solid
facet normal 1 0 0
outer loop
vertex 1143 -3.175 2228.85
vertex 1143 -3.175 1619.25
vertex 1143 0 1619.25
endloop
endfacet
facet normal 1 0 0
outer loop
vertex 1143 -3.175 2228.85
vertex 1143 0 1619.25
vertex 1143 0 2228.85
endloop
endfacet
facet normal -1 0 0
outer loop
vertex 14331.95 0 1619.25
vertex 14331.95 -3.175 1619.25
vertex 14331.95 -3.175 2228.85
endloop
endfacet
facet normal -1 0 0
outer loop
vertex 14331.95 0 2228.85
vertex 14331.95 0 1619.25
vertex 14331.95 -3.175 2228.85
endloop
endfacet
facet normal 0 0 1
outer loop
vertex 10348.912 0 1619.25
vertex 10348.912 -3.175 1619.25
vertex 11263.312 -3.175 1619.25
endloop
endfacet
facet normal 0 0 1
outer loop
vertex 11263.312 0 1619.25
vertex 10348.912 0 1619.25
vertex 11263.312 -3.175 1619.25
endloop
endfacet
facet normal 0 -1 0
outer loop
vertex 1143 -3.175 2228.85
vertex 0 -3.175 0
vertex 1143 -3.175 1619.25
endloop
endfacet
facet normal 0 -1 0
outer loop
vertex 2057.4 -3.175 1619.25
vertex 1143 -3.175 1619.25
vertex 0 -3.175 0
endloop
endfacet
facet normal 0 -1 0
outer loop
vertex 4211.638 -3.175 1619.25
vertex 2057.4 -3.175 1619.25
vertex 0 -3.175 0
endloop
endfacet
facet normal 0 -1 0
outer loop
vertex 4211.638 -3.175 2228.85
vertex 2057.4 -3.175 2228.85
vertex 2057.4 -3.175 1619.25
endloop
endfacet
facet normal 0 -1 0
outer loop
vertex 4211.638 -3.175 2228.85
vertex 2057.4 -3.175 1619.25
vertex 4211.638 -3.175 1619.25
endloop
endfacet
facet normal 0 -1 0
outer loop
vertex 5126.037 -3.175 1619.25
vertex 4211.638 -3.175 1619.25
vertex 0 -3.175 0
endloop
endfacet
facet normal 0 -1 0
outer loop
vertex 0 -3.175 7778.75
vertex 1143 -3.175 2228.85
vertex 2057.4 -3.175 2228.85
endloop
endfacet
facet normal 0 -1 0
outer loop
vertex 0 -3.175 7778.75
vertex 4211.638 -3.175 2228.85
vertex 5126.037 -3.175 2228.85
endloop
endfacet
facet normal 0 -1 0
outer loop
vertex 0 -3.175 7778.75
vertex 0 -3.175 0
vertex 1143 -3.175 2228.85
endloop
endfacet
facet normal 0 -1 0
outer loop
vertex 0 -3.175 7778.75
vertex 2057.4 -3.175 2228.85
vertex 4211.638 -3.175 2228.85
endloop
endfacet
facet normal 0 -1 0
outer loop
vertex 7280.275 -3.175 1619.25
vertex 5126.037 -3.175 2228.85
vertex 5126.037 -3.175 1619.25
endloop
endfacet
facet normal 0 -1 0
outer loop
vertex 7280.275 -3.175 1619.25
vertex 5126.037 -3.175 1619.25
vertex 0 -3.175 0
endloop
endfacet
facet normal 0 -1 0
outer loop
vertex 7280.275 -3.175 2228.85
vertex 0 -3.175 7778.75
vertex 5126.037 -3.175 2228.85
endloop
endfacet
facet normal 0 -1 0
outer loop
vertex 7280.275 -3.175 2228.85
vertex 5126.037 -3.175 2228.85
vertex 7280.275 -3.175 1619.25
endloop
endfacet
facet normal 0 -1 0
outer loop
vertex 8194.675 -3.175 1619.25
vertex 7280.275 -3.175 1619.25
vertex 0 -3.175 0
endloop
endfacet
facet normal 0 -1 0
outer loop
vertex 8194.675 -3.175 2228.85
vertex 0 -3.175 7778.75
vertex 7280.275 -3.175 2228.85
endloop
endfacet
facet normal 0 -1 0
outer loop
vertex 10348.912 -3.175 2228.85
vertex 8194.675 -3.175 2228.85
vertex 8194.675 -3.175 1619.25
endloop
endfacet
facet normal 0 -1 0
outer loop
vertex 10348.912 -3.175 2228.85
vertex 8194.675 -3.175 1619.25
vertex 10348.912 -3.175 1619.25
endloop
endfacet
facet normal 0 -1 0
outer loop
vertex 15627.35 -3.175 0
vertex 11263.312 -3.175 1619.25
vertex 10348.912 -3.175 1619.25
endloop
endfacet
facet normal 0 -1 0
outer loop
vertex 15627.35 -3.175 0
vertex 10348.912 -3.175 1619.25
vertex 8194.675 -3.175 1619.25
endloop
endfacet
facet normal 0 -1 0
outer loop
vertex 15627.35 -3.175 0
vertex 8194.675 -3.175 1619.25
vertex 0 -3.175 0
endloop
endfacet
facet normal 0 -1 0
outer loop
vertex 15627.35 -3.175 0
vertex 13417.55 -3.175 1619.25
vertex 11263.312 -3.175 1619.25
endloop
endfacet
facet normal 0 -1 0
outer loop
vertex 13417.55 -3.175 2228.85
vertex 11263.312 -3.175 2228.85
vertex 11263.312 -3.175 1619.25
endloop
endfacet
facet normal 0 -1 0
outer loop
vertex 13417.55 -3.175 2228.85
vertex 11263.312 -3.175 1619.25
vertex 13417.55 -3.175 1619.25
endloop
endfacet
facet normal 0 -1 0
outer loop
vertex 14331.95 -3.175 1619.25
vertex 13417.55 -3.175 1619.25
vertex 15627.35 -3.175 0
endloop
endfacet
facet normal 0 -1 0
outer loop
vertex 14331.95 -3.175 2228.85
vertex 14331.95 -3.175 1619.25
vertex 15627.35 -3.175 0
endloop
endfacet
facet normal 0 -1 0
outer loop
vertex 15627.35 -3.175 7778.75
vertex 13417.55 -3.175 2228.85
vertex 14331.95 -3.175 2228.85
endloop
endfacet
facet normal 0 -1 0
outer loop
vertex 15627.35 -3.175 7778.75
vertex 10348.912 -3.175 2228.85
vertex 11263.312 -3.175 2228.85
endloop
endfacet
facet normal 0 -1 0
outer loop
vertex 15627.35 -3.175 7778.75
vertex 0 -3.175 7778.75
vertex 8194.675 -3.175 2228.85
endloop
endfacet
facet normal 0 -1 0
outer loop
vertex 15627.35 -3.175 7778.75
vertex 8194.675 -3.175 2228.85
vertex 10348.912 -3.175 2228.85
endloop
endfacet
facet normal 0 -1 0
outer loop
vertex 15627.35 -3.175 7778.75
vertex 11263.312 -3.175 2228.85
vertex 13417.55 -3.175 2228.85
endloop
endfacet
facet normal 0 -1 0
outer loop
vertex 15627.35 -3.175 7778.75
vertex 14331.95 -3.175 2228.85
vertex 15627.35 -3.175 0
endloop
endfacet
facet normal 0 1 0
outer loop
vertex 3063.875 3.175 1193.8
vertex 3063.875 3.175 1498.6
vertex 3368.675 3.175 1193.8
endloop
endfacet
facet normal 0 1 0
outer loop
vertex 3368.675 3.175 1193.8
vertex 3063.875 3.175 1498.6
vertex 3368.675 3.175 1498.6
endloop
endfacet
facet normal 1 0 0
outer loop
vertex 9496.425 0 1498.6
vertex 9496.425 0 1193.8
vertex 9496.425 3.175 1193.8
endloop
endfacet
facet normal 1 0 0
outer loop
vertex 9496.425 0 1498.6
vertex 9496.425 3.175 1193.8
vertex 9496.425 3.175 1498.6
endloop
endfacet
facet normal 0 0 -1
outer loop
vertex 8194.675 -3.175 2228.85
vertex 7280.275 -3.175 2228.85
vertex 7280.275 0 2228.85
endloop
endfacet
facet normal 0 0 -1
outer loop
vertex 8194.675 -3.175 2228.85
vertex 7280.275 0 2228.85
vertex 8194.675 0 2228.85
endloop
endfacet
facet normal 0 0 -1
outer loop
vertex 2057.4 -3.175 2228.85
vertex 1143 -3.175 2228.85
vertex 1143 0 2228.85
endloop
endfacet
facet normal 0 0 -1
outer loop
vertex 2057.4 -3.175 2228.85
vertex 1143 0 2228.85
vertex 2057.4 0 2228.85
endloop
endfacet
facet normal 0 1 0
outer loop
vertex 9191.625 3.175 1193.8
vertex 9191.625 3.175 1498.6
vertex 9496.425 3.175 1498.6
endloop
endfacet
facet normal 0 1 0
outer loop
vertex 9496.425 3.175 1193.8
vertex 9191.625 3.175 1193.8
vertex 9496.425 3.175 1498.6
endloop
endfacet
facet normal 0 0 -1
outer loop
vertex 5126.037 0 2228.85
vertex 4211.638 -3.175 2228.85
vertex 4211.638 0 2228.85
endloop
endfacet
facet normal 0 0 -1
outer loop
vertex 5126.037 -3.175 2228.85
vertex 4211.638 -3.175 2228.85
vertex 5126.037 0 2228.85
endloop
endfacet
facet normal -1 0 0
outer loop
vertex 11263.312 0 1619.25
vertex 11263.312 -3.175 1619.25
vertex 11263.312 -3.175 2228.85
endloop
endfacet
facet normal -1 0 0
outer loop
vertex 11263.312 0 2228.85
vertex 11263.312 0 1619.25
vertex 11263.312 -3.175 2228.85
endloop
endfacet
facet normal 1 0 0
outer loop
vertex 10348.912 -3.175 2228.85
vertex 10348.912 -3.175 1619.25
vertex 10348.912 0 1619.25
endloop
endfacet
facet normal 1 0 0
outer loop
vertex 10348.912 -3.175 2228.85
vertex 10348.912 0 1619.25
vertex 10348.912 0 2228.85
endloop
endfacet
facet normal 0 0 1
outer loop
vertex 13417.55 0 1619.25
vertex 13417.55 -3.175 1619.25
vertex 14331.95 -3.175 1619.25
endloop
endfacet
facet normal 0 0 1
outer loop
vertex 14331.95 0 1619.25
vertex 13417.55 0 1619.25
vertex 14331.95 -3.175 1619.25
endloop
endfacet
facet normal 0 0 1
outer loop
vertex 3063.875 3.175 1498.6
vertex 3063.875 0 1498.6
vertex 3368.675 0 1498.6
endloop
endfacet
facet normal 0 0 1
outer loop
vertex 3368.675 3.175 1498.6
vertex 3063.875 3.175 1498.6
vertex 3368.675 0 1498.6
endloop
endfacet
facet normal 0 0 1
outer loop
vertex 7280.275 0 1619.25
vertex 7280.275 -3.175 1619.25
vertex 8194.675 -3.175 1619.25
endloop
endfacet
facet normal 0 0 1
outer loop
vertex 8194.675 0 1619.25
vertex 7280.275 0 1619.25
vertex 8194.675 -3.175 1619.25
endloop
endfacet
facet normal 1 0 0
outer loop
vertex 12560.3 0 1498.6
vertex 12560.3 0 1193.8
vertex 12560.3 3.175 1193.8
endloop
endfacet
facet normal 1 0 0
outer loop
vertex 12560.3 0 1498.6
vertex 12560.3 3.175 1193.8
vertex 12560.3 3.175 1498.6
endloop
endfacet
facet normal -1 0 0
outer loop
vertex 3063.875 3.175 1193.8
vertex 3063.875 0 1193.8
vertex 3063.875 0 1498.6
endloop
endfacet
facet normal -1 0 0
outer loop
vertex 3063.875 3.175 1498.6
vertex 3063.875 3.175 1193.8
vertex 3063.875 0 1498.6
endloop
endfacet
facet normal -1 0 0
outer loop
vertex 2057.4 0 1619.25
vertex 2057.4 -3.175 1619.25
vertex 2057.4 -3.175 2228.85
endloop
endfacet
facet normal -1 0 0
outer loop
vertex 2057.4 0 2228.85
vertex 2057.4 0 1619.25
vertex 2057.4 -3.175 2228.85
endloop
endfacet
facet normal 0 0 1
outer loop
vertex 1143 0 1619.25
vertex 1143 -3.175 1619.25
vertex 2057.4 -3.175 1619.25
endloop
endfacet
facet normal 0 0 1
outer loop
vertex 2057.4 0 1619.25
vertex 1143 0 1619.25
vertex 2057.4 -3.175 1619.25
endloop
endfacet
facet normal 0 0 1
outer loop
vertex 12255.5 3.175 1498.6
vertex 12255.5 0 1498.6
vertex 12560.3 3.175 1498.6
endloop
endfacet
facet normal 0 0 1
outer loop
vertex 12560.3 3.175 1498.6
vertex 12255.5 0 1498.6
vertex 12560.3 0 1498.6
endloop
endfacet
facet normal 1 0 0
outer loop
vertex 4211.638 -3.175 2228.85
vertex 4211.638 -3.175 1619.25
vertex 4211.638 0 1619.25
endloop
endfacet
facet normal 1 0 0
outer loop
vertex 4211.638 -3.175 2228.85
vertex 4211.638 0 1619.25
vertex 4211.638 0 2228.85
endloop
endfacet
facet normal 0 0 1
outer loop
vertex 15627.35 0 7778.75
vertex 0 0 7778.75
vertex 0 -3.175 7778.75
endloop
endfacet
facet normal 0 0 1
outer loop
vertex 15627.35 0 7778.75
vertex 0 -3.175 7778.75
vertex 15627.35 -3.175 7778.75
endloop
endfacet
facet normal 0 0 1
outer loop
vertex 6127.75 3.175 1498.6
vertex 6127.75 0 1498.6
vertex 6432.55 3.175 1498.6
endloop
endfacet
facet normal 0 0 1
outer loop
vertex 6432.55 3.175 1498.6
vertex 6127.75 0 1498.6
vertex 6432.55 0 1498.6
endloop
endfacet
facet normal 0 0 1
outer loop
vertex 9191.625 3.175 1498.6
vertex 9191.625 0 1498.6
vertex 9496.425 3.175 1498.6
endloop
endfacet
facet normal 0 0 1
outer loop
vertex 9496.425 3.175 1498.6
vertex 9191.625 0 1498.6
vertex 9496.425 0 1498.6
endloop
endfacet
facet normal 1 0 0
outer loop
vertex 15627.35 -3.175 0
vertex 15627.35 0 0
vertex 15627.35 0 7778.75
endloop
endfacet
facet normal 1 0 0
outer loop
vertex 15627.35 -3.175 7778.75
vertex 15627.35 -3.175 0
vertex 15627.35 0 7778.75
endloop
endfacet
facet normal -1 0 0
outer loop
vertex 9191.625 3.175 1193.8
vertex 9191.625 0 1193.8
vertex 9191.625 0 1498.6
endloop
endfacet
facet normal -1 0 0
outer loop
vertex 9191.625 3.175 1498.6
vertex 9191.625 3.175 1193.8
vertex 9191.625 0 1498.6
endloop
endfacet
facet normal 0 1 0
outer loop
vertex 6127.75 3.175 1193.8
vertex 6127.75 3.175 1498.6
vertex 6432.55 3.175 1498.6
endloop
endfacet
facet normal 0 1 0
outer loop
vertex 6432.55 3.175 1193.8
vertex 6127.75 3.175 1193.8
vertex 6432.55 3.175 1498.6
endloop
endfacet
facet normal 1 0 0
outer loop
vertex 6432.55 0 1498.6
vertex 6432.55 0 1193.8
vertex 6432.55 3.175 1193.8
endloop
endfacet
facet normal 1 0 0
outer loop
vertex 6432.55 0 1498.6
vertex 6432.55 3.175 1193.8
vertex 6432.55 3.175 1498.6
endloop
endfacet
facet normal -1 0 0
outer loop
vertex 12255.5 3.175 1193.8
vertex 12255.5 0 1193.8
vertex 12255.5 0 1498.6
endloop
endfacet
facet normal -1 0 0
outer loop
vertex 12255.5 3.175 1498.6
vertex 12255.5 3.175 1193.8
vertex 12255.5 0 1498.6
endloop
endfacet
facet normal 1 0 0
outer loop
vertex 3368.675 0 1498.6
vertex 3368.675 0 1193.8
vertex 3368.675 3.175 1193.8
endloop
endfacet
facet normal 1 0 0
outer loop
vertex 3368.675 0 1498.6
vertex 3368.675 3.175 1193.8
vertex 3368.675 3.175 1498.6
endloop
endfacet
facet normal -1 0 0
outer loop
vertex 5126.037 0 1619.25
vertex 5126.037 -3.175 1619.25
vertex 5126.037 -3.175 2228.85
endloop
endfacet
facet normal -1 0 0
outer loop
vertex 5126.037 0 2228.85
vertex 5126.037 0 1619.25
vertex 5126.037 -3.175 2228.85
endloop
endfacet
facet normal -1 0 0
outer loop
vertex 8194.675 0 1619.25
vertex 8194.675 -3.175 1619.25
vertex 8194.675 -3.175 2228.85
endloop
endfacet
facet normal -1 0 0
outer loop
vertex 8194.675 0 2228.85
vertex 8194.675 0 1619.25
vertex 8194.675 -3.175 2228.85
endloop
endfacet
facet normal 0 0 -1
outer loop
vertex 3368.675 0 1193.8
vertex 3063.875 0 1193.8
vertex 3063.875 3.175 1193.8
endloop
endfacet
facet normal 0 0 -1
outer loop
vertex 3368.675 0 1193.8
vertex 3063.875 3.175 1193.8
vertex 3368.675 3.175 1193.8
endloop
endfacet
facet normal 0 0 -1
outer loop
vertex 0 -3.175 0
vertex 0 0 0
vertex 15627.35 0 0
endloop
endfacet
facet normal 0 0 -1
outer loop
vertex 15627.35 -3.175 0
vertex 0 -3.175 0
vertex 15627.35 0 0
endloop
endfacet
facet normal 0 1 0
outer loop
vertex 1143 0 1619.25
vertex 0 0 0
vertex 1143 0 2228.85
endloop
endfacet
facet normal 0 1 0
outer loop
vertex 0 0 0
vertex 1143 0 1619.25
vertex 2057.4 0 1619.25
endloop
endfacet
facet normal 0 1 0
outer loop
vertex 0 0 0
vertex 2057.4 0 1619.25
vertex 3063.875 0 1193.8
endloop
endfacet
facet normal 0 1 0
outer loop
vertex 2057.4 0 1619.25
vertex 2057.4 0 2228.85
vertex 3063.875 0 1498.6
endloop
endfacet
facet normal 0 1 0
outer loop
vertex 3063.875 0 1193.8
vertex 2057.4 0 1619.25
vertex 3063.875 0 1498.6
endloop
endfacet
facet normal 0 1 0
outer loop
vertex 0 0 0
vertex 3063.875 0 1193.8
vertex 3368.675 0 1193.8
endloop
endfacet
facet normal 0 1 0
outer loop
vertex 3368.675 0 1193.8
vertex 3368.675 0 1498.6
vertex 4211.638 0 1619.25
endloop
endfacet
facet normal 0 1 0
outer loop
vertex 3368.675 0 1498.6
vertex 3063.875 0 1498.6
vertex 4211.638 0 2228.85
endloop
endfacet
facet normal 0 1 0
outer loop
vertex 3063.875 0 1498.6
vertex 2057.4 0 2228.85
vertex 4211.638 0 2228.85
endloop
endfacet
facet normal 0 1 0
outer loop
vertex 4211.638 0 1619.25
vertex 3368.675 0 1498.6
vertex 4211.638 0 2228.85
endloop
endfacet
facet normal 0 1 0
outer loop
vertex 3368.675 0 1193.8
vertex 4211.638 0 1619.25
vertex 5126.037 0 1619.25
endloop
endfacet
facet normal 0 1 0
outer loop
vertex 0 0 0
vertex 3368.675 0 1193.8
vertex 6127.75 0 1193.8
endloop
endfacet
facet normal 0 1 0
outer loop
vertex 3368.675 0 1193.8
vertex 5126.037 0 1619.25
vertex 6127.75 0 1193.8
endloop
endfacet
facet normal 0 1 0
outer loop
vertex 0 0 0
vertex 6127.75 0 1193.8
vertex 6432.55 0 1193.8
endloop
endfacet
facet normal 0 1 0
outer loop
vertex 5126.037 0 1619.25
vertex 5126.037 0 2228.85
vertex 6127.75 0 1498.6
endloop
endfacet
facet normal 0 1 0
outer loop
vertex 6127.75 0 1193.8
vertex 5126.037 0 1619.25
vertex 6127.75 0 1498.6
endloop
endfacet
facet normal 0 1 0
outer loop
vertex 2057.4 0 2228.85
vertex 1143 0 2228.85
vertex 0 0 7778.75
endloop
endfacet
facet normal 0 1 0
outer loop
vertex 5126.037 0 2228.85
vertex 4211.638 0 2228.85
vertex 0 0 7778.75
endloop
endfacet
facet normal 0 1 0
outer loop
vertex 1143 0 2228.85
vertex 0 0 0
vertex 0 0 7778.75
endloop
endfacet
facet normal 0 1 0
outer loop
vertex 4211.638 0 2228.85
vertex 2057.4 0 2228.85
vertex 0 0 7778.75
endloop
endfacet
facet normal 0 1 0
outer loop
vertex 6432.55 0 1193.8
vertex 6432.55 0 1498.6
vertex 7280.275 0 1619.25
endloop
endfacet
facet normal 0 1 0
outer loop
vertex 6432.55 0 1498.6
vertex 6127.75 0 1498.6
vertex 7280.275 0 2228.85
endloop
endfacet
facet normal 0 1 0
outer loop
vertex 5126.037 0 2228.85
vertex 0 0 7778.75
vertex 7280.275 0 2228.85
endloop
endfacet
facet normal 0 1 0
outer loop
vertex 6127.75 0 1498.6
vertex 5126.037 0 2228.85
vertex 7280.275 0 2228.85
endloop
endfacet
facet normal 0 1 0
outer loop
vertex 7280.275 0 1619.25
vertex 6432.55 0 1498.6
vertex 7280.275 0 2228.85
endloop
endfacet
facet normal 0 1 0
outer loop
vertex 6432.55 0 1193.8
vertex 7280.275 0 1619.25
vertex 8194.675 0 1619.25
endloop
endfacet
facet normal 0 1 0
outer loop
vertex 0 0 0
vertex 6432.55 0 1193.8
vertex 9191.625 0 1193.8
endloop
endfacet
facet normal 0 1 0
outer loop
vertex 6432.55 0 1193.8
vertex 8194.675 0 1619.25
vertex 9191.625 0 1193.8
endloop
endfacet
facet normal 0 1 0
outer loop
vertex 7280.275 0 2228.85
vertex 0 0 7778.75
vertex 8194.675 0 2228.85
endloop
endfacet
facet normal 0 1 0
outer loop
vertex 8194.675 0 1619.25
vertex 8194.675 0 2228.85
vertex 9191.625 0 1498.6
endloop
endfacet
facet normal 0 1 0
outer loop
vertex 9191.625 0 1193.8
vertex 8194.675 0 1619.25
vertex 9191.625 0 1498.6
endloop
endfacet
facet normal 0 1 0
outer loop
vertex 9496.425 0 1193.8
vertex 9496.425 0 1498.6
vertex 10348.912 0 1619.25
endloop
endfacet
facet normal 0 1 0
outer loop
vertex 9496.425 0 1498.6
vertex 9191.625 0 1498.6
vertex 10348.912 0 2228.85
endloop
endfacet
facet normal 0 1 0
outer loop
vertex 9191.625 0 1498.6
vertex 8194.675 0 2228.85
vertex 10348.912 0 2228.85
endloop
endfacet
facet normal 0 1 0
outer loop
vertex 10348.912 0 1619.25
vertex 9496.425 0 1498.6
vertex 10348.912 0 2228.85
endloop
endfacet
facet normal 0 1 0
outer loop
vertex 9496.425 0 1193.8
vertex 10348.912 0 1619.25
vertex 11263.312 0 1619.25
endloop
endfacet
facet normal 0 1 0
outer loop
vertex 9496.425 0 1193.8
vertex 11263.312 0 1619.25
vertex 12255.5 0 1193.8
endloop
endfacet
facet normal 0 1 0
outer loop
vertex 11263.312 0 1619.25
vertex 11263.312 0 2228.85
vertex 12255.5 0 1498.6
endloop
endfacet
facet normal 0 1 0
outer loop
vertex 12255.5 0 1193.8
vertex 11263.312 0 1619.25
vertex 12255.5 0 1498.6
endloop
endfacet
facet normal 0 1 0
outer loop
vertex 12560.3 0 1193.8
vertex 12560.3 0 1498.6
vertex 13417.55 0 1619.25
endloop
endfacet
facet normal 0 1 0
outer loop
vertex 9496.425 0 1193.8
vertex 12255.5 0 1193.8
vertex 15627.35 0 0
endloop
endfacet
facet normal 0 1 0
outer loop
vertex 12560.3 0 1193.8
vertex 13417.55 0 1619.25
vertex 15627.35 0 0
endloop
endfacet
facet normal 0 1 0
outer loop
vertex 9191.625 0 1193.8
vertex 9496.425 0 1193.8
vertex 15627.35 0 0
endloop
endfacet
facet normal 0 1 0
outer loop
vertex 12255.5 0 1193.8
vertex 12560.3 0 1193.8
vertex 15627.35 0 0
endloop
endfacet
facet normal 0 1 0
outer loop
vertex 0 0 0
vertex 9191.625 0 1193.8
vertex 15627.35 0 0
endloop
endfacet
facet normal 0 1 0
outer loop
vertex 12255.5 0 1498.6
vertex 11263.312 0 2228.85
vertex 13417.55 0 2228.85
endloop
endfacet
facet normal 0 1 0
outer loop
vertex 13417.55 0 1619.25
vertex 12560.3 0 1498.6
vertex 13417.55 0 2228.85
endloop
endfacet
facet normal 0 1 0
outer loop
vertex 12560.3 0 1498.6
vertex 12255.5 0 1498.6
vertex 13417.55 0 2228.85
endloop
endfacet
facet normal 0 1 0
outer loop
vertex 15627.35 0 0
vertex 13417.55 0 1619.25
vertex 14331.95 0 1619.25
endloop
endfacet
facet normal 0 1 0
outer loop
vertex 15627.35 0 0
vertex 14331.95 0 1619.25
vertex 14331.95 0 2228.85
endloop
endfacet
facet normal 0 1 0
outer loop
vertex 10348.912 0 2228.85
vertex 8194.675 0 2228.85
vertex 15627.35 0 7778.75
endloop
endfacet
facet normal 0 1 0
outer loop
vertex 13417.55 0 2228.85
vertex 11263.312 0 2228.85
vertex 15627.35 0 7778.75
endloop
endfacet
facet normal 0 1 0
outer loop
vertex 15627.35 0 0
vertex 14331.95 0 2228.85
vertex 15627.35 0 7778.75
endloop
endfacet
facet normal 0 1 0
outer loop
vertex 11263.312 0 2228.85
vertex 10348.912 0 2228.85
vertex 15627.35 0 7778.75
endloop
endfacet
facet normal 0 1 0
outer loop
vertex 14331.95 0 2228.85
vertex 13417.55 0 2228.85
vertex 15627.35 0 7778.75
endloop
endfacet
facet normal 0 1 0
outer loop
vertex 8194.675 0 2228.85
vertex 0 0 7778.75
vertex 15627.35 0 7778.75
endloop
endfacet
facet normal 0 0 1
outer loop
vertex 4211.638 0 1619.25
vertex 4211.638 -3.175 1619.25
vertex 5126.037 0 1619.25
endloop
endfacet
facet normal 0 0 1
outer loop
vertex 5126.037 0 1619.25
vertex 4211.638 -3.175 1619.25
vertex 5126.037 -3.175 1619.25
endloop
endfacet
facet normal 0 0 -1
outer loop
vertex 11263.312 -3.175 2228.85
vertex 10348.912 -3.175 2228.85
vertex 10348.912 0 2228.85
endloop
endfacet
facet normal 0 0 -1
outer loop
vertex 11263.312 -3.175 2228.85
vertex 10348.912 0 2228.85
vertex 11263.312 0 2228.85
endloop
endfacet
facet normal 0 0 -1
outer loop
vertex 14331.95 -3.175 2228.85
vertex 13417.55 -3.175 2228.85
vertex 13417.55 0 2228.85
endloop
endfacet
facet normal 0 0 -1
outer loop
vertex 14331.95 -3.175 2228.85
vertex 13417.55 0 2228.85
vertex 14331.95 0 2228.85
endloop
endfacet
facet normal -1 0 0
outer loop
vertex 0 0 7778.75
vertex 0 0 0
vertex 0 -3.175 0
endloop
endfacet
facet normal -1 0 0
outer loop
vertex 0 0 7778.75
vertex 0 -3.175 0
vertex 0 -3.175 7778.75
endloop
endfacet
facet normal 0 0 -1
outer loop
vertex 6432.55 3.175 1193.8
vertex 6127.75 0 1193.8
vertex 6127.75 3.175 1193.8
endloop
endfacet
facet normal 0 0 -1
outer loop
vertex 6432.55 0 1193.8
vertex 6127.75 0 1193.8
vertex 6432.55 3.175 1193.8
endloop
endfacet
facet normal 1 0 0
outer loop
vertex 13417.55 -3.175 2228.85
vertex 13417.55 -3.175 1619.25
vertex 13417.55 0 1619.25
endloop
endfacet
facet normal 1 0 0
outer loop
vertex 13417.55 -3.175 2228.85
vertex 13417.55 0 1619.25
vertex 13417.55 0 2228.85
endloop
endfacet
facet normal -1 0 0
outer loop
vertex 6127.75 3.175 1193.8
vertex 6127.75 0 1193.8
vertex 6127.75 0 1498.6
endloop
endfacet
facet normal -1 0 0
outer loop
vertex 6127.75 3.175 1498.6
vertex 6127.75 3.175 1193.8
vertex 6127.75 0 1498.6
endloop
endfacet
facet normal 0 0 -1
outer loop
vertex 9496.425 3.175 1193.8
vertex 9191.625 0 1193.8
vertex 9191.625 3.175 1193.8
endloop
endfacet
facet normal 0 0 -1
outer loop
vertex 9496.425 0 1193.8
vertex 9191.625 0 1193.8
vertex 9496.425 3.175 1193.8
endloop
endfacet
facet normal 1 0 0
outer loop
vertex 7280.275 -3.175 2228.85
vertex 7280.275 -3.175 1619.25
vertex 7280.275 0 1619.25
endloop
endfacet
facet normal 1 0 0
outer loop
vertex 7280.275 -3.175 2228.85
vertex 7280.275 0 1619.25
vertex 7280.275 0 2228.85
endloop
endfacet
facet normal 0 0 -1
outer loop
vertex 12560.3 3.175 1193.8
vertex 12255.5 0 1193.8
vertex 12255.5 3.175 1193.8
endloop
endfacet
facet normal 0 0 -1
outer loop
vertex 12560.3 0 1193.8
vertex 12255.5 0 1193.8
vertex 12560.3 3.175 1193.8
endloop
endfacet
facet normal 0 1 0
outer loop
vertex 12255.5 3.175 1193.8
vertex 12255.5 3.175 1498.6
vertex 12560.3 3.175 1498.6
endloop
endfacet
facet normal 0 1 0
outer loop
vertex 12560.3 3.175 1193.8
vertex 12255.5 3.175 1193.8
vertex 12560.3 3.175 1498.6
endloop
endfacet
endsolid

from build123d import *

# Parameters (mm, degrees)
F0_W     = 15627.35
F0_H     = 7778.75
F1_DEPTH = 3.175
F4_W     = 914.4
F4_H     = 609.6
F5_DEPTH = 3.175
F3_W     = 304.8
F3_H     = 304.8
F6_DEPTH = 6.35


with BuildPart() as f1:
    # F0 (on Front) → F1 (new body)
    with BuildSketch(Plane.XZ):
        with Locations((7813.675, 3889.375)):
            Rectangle(F0_W, F0_H)
    extrude(amount=F1_DEPTH)

    # F4 (on face) → F5 (cut, through all)
    with BuildSketch(Plane.XZ.offset(3.175)):
        with Locations((1600.2, 1924.05)):
            Rectangle(F4_W, F4_H)
        with Locations((4668.8375, 1924.05)):
            Rectangle(F4_W, F4_H)
        with Locations((7737.475, 1924.05)):
            Rectangle(F4_W, F4_H)
        with Locations((10806.1125, 1924.05)):
            Rectangle(F4_W, F4_H)
        with Locations((13874.75, 1924.05)):
            Rectangle(F4_W, F4_H)
    extrude(amount=-F5_DEPTH, mode=Mode.SUBTRACT)

    # F3 (on face) → F6 (join)
    with BuildSketch(Plane.XZ.offset(3.175)):
        with Locations((3216.275, 1346.2)):
            Rectangle(F3_W, F3_H)
        with Locations((6280.15, 1346.2)):
            Rectangle(F3_W, F3_H)
        with Locations((9344.025, 1346.2)):
            Rectangle(F3_W, F3_H)
        with Locations((12407.9, 1346.2)):
            Rectangle(F3_W, F3_H)
    extrude(amount=-F6_DEPTH)


solid = f1.part
